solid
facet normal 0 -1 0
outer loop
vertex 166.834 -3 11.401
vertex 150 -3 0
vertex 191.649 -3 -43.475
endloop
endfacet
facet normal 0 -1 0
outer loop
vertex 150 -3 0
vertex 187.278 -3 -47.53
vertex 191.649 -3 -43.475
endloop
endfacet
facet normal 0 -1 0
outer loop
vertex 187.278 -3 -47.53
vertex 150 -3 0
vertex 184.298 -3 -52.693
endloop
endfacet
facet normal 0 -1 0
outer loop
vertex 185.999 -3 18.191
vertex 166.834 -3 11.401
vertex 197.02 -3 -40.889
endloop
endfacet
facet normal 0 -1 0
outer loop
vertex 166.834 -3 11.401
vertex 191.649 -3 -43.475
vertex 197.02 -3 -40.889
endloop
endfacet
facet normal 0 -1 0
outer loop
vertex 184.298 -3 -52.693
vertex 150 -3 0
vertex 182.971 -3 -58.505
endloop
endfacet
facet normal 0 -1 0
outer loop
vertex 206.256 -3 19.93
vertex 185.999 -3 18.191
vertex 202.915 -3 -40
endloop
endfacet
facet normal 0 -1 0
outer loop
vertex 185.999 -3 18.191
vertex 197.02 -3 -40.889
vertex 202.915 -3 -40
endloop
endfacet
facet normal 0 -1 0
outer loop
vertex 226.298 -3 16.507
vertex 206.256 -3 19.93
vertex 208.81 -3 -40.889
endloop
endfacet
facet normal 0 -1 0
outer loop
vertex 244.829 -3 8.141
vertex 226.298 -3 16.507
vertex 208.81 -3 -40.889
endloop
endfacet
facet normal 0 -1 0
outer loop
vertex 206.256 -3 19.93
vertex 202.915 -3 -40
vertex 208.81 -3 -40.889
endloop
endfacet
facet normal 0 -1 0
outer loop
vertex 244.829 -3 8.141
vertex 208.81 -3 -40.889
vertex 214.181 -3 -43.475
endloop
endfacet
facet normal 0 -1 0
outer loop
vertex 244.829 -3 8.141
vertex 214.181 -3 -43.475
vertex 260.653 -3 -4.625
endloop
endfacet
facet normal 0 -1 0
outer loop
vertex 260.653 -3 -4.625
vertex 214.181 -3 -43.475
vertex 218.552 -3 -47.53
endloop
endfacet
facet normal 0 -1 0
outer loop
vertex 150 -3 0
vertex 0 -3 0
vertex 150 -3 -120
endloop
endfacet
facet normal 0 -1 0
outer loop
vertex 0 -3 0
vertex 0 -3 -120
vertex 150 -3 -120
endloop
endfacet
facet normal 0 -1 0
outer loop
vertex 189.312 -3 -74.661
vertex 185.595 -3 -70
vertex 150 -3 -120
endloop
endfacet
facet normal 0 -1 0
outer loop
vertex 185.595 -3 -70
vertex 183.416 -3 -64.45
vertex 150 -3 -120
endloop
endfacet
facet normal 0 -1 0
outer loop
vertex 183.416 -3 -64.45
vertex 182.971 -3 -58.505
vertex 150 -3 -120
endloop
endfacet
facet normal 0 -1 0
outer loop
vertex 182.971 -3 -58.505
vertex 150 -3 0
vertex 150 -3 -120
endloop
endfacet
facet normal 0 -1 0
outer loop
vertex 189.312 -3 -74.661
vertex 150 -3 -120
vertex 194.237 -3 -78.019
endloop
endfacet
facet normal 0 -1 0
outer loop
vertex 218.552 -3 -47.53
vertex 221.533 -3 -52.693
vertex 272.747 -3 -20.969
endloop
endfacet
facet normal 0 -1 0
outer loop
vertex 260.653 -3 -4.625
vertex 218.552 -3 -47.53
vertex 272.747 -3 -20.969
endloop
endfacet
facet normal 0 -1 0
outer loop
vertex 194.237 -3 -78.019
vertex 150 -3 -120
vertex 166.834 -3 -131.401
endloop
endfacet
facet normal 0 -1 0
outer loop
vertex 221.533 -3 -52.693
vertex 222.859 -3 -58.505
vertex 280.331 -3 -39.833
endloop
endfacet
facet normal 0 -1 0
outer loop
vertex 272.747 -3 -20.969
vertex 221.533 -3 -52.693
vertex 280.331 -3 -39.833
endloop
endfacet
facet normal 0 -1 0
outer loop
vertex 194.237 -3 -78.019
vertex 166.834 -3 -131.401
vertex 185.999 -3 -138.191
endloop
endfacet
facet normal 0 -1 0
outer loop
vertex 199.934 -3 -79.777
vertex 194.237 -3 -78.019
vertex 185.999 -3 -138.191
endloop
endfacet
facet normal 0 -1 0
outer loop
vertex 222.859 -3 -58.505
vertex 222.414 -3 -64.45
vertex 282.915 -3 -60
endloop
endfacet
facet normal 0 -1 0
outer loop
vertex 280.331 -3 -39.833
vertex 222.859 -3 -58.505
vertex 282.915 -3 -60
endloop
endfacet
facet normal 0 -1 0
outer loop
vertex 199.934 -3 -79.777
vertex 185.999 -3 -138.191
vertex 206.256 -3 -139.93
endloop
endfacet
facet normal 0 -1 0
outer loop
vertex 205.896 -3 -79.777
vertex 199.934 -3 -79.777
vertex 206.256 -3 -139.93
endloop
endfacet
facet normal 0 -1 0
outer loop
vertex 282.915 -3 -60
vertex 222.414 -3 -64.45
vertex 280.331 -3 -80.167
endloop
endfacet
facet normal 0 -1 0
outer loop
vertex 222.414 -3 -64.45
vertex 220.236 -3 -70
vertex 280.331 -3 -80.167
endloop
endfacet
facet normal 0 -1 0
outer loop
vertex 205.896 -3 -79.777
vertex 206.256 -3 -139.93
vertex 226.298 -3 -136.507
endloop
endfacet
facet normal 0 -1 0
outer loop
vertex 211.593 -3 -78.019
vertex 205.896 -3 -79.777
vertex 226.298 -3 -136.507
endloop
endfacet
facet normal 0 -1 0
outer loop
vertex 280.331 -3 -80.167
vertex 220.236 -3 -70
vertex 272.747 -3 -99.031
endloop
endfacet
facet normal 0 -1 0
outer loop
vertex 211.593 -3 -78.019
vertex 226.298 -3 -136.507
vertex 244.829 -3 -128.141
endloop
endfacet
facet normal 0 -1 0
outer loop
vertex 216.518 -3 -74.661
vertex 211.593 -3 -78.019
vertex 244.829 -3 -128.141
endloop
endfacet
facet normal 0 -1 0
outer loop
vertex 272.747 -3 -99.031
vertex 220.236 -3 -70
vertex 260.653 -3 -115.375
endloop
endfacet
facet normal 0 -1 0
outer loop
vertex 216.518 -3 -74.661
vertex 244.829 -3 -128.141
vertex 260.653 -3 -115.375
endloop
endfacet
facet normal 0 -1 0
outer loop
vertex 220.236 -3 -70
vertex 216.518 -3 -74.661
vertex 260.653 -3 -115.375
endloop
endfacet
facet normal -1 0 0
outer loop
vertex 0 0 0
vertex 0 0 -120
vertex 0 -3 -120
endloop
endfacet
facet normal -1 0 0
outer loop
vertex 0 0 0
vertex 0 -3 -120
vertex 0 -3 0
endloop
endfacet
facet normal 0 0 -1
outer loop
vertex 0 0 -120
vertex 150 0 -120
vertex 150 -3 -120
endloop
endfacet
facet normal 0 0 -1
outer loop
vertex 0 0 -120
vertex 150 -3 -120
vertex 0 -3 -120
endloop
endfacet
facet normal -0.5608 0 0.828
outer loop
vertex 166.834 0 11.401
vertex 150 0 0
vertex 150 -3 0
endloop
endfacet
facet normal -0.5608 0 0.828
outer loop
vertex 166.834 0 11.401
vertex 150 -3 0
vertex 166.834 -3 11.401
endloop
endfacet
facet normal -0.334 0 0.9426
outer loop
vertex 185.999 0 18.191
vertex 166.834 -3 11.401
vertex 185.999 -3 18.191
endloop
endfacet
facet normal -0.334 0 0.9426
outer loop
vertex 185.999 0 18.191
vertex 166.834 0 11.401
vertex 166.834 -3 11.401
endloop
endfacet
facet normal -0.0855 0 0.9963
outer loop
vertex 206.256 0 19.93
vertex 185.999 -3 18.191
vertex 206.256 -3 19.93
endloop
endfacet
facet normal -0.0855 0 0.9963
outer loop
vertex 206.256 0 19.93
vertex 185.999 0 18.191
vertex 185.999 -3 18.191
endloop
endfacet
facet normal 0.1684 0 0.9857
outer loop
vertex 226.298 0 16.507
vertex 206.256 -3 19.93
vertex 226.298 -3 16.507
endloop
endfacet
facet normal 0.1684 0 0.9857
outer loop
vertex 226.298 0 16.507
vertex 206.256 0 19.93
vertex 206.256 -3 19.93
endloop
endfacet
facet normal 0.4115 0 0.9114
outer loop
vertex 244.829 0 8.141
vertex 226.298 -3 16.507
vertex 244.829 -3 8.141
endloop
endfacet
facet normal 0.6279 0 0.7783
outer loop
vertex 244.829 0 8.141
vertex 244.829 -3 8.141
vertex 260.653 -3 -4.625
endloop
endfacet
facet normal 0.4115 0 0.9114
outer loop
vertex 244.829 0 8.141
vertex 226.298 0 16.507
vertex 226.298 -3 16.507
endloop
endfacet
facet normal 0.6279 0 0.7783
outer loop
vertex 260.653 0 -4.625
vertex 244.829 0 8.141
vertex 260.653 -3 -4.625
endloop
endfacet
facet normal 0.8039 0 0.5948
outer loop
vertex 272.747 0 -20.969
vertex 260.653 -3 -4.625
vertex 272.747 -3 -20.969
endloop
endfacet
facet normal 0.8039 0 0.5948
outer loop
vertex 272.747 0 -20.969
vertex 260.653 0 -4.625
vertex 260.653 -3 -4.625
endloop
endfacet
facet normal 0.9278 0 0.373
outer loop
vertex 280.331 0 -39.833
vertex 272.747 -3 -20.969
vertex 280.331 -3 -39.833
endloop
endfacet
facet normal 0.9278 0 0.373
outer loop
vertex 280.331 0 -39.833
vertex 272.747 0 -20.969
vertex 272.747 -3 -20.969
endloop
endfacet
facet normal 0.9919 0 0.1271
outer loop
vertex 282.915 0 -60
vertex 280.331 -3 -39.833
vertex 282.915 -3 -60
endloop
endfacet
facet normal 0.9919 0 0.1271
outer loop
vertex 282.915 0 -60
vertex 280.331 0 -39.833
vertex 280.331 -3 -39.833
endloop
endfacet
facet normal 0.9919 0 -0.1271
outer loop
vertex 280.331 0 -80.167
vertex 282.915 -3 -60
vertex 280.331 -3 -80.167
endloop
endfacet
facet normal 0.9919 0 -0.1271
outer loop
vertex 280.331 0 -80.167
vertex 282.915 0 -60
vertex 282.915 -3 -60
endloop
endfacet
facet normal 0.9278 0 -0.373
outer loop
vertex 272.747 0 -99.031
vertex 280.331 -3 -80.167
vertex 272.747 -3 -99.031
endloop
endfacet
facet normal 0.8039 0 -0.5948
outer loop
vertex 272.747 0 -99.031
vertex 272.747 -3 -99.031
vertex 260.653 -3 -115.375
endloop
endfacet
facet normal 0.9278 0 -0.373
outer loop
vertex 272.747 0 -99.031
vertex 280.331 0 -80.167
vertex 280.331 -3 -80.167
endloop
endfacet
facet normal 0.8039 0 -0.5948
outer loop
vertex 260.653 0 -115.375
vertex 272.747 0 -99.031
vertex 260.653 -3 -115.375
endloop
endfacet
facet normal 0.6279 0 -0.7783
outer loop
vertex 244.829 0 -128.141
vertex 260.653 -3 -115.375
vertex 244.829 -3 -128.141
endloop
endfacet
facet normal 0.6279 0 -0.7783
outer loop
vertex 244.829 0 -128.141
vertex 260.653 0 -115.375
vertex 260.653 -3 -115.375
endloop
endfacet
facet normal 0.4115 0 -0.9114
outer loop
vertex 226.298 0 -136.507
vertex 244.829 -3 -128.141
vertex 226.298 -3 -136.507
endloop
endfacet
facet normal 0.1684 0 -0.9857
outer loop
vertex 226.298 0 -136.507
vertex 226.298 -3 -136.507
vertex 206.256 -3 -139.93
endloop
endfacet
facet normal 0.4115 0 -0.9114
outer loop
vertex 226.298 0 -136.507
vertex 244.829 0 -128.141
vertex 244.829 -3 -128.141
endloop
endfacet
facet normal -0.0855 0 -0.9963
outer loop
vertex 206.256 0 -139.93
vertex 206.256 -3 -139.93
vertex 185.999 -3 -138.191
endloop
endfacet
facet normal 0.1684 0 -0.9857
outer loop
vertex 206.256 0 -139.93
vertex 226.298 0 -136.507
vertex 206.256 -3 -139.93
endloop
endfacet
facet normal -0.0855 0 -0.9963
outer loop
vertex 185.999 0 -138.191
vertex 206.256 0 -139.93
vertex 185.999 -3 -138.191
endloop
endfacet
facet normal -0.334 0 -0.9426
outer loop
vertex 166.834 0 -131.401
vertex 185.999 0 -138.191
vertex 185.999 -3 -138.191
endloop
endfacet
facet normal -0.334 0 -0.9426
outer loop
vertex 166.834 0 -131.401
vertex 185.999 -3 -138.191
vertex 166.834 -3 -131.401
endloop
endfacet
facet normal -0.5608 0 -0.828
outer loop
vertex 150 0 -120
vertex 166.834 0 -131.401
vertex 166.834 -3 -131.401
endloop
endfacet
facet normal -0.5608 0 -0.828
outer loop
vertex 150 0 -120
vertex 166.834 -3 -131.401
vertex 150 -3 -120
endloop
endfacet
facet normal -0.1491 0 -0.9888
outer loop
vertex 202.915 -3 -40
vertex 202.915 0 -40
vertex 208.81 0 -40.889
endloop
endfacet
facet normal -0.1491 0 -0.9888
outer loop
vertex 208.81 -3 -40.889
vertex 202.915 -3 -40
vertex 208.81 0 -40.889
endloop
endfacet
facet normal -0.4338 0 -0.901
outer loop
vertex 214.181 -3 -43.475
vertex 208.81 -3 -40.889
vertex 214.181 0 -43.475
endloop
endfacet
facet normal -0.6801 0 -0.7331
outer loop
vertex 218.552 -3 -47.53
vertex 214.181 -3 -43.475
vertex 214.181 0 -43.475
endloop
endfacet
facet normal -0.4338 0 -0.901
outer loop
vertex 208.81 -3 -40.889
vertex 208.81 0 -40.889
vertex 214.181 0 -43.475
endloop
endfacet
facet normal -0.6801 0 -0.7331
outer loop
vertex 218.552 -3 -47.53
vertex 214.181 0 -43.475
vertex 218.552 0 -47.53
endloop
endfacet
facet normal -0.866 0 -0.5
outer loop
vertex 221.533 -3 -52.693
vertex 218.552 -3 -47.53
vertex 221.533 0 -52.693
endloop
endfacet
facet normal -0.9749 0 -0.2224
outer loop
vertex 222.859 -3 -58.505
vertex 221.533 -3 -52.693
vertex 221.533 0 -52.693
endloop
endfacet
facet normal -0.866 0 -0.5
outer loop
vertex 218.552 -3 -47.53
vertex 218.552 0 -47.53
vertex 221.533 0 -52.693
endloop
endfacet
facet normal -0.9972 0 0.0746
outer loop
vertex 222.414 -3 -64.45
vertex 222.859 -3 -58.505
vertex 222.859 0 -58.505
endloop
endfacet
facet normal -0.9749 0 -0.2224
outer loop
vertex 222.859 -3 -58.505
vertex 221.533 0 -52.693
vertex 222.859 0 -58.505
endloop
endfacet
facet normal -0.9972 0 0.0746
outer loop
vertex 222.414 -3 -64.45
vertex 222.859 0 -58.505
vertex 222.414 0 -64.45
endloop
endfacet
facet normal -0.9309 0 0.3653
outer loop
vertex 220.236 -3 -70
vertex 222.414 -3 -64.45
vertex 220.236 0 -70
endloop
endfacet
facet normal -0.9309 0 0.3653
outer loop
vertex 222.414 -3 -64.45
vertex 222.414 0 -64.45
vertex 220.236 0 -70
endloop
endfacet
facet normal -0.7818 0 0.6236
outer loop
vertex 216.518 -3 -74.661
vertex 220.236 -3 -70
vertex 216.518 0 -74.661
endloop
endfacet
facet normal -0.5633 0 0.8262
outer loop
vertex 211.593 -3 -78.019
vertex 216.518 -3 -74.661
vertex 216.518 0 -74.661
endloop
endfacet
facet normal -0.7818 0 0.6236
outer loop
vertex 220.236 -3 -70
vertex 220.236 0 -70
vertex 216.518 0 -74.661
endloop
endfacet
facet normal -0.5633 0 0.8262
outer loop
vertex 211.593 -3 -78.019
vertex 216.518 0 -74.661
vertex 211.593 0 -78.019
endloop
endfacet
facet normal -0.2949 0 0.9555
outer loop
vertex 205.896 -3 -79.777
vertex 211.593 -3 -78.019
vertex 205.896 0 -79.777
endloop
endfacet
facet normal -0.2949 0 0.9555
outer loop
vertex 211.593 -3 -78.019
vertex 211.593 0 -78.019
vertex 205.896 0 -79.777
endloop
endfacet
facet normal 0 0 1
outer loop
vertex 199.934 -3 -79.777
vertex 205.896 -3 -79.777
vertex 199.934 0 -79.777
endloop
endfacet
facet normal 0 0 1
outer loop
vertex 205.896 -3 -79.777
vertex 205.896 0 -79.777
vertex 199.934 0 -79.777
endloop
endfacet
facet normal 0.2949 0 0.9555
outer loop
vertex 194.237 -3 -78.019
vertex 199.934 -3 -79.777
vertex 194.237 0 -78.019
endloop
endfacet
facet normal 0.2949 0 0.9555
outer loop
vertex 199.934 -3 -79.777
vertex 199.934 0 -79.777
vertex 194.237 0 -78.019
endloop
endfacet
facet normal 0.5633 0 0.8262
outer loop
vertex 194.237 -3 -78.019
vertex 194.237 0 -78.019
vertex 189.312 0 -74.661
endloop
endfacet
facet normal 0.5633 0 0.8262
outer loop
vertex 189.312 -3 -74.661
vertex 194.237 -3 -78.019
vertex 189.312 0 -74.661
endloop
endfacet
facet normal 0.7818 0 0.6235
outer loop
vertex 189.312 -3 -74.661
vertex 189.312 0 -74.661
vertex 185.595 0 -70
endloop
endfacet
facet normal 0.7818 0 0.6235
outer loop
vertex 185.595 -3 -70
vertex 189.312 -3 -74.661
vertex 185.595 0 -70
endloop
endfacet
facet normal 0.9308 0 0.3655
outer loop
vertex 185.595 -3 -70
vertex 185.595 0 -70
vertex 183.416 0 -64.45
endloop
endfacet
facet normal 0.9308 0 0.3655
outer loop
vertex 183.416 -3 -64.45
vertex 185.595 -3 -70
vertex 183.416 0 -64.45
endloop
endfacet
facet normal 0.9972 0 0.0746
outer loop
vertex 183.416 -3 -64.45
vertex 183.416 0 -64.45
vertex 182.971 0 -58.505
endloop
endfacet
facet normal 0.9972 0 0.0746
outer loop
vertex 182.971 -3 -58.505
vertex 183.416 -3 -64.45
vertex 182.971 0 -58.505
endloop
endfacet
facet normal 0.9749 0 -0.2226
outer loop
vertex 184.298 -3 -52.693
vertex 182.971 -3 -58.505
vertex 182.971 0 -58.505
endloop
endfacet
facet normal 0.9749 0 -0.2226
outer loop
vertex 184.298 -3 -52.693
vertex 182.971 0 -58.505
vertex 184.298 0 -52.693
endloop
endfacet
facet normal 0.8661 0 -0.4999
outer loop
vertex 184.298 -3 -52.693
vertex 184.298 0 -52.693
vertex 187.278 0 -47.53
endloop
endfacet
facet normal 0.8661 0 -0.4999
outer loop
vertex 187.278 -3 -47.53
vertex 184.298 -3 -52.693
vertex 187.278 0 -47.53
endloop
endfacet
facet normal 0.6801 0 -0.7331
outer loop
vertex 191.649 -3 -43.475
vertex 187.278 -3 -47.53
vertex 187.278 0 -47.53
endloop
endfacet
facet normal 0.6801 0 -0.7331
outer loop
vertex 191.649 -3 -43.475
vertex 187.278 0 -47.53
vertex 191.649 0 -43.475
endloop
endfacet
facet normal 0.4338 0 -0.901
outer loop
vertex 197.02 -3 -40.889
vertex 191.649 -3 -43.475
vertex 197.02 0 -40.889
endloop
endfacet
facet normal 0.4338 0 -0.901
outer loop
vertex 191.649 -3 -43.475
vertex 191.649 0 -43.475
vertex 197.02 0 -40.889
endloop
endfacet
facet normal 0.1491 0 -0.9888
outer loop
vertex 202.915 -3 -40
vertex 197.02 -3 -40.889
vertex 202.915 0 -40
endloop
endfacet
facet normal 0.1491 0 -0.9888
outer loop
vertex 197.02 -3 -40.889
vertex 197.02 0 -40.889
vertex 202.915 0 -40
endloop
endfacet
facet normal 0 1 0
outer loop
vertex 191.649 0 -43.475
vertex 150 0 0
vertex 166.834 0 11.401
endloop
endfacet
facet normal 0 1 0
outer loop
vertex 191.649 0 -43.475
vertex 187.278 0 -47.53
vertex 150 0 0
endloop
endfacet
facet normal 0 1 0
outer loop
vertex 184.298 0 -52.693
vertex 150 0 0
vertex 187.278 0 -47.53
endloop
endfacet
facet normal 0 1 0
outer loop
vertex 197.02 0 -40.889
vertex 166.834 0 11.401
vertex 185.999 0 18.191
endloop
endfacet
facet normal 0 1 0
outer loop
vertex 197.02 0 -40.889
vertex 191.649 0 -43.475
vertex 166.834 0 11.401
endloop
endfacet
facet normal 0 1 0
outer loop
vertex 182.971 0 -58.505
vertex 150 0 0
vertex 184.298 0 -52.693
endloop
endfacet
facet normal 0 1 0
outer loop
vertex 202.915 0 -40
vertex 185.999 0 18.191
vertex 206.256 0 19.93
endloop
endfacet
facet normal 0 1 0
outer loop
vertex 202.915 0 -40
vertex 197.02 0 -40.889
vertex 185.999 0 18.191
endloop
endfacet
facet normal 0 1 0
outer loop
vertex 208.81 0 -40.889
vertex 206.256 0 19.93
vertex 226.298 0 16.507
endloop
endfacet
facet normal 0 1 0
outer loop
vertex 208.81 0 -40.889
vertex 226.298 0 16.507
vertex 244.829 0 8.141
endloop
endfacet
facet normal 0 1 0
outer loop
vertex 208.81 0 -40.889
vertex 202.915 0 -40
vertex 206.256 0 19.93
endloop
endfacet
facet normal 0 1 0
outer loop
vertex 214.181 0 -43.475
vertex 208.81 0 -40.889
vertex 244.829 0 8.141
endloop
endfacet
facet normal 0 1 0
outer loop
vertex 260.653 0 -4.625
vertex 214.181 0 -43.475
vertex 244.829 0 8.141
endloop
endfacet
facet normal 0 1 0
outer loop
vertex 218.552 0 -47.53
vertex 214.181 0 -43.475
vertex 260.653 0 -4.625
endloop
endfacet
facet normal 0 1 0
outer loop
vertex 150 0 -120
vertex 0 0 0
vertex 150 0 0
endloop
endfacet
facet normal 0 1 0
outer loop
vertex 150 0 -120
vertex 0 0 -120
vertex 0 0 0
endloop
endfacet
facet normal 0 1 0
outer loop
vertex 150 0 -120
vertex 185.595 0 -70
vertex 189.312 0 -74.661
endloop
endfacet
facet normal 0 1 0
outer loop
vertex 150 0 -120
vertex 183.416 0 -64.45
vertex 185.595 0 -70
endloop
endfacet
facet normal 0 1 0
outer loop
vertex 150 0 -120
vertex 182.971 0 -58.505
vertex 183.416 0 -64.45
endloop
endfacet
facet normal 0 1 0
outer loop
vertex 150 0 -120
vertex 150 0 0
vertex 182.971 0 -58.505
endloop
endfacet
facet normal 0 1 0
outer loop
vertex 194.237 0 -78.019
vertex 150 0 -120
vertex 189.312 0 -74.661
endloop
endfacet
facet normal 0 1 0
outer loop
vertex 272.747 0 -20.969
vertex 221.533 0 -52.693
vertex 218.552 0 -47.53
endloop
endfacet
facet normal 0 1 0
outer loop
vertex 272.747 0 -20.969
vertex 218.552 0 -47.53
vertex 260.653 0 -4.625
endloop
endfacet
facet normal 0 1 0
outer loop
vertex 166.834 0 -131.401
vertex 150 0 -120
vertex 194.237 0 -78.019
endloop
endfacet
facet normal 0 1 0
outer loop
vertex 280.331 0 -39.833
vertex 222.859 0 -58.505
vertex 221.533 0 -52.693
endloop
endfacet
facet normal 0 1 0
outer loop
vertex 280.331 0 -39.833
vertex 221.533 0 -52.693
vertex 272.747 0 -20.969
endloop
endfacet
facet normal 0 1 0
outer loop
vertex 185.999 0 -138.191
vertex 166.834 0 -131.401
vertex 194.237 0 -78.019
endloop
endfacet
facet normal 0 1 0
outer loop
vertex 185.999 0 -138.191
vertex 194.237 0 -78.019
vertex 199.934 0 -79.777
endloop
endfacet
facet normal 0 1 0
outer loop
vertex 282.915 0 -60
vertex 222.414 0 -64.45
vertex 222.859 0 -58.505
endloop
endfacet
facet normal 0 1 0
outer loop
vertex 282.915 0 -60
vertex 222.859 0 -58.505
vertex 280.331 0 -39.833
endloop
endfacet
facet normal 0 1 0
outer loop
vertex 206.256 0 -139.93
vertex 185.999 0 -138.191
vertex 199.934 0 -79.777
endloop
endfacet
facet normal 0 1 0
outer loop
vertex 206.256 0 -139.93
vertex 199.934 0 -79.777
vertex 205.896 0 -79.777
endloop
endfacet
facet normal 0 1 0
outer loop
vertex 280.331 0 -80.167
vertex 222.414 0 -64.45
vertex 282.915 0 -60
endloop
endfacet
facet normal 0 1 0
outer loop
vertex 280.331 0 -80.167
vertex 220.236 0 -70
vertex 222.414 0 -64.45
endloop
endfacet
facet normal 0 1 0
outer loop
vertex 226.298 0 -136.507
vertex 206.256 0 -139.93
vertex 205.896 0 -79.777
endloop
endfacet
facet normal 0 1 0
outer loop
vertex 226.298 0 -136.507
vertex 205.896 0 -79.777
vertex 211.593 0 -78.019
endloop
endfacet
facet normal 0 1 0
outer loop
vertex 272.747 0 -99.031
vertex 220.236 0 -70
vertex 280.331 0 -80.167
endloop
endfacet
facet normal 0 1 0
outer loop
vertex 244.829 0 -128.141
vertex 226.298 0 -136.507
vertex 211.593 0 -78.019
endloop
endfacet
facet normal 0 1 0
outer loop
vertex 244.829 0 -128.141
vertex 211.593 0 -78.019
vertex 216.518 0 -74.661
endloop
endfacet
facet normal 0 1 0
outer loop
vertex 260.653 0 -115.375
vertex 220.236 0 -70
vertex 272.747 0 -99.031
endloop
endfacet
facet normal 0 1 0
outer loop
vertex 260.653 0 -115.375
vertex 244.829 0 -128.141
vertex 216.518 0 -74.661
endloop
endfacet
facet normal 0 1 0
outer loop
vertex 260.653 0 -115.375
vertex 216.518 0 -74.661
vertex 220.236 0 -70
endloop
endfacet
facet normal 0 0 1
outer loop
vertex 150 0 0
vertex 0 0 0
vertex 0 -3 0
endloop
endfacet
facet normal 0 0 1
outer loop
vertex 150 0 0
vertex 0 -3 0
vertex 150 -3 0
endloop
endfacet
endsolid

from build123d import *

# Parameters (mm, degrees)
SKETCH1_R          = 20
BASE_FLANGE1_DEPTH = 3


# Sheet-metal steps are written as plain solids
with BuildPart() as part:
    # Sketch1 → Base-Flange1 (new body)
    with BuildSketch(Plane(origin=(0, 0, 0), x_dir=(1, 0, 0), z_dir=(0, 1, 0))):
        with BuildLine():
            Line((0, 0), (150, 0))
            ThreePointArc((150, 0), (282.915026221, 60), (150, 120))
            Line((150, 120), (0, 120))
            Line((0, 120), (0, 0))
        make_face()
        with Locations(Location((202.915026221, 60, 0), (0, 0, 270))):
            Circle(SKETCH1_R, mode=Mode.SUBTRACT)
    extrude(amount=-BASE_FLANGE1_DEPTH)


solid = part.part
